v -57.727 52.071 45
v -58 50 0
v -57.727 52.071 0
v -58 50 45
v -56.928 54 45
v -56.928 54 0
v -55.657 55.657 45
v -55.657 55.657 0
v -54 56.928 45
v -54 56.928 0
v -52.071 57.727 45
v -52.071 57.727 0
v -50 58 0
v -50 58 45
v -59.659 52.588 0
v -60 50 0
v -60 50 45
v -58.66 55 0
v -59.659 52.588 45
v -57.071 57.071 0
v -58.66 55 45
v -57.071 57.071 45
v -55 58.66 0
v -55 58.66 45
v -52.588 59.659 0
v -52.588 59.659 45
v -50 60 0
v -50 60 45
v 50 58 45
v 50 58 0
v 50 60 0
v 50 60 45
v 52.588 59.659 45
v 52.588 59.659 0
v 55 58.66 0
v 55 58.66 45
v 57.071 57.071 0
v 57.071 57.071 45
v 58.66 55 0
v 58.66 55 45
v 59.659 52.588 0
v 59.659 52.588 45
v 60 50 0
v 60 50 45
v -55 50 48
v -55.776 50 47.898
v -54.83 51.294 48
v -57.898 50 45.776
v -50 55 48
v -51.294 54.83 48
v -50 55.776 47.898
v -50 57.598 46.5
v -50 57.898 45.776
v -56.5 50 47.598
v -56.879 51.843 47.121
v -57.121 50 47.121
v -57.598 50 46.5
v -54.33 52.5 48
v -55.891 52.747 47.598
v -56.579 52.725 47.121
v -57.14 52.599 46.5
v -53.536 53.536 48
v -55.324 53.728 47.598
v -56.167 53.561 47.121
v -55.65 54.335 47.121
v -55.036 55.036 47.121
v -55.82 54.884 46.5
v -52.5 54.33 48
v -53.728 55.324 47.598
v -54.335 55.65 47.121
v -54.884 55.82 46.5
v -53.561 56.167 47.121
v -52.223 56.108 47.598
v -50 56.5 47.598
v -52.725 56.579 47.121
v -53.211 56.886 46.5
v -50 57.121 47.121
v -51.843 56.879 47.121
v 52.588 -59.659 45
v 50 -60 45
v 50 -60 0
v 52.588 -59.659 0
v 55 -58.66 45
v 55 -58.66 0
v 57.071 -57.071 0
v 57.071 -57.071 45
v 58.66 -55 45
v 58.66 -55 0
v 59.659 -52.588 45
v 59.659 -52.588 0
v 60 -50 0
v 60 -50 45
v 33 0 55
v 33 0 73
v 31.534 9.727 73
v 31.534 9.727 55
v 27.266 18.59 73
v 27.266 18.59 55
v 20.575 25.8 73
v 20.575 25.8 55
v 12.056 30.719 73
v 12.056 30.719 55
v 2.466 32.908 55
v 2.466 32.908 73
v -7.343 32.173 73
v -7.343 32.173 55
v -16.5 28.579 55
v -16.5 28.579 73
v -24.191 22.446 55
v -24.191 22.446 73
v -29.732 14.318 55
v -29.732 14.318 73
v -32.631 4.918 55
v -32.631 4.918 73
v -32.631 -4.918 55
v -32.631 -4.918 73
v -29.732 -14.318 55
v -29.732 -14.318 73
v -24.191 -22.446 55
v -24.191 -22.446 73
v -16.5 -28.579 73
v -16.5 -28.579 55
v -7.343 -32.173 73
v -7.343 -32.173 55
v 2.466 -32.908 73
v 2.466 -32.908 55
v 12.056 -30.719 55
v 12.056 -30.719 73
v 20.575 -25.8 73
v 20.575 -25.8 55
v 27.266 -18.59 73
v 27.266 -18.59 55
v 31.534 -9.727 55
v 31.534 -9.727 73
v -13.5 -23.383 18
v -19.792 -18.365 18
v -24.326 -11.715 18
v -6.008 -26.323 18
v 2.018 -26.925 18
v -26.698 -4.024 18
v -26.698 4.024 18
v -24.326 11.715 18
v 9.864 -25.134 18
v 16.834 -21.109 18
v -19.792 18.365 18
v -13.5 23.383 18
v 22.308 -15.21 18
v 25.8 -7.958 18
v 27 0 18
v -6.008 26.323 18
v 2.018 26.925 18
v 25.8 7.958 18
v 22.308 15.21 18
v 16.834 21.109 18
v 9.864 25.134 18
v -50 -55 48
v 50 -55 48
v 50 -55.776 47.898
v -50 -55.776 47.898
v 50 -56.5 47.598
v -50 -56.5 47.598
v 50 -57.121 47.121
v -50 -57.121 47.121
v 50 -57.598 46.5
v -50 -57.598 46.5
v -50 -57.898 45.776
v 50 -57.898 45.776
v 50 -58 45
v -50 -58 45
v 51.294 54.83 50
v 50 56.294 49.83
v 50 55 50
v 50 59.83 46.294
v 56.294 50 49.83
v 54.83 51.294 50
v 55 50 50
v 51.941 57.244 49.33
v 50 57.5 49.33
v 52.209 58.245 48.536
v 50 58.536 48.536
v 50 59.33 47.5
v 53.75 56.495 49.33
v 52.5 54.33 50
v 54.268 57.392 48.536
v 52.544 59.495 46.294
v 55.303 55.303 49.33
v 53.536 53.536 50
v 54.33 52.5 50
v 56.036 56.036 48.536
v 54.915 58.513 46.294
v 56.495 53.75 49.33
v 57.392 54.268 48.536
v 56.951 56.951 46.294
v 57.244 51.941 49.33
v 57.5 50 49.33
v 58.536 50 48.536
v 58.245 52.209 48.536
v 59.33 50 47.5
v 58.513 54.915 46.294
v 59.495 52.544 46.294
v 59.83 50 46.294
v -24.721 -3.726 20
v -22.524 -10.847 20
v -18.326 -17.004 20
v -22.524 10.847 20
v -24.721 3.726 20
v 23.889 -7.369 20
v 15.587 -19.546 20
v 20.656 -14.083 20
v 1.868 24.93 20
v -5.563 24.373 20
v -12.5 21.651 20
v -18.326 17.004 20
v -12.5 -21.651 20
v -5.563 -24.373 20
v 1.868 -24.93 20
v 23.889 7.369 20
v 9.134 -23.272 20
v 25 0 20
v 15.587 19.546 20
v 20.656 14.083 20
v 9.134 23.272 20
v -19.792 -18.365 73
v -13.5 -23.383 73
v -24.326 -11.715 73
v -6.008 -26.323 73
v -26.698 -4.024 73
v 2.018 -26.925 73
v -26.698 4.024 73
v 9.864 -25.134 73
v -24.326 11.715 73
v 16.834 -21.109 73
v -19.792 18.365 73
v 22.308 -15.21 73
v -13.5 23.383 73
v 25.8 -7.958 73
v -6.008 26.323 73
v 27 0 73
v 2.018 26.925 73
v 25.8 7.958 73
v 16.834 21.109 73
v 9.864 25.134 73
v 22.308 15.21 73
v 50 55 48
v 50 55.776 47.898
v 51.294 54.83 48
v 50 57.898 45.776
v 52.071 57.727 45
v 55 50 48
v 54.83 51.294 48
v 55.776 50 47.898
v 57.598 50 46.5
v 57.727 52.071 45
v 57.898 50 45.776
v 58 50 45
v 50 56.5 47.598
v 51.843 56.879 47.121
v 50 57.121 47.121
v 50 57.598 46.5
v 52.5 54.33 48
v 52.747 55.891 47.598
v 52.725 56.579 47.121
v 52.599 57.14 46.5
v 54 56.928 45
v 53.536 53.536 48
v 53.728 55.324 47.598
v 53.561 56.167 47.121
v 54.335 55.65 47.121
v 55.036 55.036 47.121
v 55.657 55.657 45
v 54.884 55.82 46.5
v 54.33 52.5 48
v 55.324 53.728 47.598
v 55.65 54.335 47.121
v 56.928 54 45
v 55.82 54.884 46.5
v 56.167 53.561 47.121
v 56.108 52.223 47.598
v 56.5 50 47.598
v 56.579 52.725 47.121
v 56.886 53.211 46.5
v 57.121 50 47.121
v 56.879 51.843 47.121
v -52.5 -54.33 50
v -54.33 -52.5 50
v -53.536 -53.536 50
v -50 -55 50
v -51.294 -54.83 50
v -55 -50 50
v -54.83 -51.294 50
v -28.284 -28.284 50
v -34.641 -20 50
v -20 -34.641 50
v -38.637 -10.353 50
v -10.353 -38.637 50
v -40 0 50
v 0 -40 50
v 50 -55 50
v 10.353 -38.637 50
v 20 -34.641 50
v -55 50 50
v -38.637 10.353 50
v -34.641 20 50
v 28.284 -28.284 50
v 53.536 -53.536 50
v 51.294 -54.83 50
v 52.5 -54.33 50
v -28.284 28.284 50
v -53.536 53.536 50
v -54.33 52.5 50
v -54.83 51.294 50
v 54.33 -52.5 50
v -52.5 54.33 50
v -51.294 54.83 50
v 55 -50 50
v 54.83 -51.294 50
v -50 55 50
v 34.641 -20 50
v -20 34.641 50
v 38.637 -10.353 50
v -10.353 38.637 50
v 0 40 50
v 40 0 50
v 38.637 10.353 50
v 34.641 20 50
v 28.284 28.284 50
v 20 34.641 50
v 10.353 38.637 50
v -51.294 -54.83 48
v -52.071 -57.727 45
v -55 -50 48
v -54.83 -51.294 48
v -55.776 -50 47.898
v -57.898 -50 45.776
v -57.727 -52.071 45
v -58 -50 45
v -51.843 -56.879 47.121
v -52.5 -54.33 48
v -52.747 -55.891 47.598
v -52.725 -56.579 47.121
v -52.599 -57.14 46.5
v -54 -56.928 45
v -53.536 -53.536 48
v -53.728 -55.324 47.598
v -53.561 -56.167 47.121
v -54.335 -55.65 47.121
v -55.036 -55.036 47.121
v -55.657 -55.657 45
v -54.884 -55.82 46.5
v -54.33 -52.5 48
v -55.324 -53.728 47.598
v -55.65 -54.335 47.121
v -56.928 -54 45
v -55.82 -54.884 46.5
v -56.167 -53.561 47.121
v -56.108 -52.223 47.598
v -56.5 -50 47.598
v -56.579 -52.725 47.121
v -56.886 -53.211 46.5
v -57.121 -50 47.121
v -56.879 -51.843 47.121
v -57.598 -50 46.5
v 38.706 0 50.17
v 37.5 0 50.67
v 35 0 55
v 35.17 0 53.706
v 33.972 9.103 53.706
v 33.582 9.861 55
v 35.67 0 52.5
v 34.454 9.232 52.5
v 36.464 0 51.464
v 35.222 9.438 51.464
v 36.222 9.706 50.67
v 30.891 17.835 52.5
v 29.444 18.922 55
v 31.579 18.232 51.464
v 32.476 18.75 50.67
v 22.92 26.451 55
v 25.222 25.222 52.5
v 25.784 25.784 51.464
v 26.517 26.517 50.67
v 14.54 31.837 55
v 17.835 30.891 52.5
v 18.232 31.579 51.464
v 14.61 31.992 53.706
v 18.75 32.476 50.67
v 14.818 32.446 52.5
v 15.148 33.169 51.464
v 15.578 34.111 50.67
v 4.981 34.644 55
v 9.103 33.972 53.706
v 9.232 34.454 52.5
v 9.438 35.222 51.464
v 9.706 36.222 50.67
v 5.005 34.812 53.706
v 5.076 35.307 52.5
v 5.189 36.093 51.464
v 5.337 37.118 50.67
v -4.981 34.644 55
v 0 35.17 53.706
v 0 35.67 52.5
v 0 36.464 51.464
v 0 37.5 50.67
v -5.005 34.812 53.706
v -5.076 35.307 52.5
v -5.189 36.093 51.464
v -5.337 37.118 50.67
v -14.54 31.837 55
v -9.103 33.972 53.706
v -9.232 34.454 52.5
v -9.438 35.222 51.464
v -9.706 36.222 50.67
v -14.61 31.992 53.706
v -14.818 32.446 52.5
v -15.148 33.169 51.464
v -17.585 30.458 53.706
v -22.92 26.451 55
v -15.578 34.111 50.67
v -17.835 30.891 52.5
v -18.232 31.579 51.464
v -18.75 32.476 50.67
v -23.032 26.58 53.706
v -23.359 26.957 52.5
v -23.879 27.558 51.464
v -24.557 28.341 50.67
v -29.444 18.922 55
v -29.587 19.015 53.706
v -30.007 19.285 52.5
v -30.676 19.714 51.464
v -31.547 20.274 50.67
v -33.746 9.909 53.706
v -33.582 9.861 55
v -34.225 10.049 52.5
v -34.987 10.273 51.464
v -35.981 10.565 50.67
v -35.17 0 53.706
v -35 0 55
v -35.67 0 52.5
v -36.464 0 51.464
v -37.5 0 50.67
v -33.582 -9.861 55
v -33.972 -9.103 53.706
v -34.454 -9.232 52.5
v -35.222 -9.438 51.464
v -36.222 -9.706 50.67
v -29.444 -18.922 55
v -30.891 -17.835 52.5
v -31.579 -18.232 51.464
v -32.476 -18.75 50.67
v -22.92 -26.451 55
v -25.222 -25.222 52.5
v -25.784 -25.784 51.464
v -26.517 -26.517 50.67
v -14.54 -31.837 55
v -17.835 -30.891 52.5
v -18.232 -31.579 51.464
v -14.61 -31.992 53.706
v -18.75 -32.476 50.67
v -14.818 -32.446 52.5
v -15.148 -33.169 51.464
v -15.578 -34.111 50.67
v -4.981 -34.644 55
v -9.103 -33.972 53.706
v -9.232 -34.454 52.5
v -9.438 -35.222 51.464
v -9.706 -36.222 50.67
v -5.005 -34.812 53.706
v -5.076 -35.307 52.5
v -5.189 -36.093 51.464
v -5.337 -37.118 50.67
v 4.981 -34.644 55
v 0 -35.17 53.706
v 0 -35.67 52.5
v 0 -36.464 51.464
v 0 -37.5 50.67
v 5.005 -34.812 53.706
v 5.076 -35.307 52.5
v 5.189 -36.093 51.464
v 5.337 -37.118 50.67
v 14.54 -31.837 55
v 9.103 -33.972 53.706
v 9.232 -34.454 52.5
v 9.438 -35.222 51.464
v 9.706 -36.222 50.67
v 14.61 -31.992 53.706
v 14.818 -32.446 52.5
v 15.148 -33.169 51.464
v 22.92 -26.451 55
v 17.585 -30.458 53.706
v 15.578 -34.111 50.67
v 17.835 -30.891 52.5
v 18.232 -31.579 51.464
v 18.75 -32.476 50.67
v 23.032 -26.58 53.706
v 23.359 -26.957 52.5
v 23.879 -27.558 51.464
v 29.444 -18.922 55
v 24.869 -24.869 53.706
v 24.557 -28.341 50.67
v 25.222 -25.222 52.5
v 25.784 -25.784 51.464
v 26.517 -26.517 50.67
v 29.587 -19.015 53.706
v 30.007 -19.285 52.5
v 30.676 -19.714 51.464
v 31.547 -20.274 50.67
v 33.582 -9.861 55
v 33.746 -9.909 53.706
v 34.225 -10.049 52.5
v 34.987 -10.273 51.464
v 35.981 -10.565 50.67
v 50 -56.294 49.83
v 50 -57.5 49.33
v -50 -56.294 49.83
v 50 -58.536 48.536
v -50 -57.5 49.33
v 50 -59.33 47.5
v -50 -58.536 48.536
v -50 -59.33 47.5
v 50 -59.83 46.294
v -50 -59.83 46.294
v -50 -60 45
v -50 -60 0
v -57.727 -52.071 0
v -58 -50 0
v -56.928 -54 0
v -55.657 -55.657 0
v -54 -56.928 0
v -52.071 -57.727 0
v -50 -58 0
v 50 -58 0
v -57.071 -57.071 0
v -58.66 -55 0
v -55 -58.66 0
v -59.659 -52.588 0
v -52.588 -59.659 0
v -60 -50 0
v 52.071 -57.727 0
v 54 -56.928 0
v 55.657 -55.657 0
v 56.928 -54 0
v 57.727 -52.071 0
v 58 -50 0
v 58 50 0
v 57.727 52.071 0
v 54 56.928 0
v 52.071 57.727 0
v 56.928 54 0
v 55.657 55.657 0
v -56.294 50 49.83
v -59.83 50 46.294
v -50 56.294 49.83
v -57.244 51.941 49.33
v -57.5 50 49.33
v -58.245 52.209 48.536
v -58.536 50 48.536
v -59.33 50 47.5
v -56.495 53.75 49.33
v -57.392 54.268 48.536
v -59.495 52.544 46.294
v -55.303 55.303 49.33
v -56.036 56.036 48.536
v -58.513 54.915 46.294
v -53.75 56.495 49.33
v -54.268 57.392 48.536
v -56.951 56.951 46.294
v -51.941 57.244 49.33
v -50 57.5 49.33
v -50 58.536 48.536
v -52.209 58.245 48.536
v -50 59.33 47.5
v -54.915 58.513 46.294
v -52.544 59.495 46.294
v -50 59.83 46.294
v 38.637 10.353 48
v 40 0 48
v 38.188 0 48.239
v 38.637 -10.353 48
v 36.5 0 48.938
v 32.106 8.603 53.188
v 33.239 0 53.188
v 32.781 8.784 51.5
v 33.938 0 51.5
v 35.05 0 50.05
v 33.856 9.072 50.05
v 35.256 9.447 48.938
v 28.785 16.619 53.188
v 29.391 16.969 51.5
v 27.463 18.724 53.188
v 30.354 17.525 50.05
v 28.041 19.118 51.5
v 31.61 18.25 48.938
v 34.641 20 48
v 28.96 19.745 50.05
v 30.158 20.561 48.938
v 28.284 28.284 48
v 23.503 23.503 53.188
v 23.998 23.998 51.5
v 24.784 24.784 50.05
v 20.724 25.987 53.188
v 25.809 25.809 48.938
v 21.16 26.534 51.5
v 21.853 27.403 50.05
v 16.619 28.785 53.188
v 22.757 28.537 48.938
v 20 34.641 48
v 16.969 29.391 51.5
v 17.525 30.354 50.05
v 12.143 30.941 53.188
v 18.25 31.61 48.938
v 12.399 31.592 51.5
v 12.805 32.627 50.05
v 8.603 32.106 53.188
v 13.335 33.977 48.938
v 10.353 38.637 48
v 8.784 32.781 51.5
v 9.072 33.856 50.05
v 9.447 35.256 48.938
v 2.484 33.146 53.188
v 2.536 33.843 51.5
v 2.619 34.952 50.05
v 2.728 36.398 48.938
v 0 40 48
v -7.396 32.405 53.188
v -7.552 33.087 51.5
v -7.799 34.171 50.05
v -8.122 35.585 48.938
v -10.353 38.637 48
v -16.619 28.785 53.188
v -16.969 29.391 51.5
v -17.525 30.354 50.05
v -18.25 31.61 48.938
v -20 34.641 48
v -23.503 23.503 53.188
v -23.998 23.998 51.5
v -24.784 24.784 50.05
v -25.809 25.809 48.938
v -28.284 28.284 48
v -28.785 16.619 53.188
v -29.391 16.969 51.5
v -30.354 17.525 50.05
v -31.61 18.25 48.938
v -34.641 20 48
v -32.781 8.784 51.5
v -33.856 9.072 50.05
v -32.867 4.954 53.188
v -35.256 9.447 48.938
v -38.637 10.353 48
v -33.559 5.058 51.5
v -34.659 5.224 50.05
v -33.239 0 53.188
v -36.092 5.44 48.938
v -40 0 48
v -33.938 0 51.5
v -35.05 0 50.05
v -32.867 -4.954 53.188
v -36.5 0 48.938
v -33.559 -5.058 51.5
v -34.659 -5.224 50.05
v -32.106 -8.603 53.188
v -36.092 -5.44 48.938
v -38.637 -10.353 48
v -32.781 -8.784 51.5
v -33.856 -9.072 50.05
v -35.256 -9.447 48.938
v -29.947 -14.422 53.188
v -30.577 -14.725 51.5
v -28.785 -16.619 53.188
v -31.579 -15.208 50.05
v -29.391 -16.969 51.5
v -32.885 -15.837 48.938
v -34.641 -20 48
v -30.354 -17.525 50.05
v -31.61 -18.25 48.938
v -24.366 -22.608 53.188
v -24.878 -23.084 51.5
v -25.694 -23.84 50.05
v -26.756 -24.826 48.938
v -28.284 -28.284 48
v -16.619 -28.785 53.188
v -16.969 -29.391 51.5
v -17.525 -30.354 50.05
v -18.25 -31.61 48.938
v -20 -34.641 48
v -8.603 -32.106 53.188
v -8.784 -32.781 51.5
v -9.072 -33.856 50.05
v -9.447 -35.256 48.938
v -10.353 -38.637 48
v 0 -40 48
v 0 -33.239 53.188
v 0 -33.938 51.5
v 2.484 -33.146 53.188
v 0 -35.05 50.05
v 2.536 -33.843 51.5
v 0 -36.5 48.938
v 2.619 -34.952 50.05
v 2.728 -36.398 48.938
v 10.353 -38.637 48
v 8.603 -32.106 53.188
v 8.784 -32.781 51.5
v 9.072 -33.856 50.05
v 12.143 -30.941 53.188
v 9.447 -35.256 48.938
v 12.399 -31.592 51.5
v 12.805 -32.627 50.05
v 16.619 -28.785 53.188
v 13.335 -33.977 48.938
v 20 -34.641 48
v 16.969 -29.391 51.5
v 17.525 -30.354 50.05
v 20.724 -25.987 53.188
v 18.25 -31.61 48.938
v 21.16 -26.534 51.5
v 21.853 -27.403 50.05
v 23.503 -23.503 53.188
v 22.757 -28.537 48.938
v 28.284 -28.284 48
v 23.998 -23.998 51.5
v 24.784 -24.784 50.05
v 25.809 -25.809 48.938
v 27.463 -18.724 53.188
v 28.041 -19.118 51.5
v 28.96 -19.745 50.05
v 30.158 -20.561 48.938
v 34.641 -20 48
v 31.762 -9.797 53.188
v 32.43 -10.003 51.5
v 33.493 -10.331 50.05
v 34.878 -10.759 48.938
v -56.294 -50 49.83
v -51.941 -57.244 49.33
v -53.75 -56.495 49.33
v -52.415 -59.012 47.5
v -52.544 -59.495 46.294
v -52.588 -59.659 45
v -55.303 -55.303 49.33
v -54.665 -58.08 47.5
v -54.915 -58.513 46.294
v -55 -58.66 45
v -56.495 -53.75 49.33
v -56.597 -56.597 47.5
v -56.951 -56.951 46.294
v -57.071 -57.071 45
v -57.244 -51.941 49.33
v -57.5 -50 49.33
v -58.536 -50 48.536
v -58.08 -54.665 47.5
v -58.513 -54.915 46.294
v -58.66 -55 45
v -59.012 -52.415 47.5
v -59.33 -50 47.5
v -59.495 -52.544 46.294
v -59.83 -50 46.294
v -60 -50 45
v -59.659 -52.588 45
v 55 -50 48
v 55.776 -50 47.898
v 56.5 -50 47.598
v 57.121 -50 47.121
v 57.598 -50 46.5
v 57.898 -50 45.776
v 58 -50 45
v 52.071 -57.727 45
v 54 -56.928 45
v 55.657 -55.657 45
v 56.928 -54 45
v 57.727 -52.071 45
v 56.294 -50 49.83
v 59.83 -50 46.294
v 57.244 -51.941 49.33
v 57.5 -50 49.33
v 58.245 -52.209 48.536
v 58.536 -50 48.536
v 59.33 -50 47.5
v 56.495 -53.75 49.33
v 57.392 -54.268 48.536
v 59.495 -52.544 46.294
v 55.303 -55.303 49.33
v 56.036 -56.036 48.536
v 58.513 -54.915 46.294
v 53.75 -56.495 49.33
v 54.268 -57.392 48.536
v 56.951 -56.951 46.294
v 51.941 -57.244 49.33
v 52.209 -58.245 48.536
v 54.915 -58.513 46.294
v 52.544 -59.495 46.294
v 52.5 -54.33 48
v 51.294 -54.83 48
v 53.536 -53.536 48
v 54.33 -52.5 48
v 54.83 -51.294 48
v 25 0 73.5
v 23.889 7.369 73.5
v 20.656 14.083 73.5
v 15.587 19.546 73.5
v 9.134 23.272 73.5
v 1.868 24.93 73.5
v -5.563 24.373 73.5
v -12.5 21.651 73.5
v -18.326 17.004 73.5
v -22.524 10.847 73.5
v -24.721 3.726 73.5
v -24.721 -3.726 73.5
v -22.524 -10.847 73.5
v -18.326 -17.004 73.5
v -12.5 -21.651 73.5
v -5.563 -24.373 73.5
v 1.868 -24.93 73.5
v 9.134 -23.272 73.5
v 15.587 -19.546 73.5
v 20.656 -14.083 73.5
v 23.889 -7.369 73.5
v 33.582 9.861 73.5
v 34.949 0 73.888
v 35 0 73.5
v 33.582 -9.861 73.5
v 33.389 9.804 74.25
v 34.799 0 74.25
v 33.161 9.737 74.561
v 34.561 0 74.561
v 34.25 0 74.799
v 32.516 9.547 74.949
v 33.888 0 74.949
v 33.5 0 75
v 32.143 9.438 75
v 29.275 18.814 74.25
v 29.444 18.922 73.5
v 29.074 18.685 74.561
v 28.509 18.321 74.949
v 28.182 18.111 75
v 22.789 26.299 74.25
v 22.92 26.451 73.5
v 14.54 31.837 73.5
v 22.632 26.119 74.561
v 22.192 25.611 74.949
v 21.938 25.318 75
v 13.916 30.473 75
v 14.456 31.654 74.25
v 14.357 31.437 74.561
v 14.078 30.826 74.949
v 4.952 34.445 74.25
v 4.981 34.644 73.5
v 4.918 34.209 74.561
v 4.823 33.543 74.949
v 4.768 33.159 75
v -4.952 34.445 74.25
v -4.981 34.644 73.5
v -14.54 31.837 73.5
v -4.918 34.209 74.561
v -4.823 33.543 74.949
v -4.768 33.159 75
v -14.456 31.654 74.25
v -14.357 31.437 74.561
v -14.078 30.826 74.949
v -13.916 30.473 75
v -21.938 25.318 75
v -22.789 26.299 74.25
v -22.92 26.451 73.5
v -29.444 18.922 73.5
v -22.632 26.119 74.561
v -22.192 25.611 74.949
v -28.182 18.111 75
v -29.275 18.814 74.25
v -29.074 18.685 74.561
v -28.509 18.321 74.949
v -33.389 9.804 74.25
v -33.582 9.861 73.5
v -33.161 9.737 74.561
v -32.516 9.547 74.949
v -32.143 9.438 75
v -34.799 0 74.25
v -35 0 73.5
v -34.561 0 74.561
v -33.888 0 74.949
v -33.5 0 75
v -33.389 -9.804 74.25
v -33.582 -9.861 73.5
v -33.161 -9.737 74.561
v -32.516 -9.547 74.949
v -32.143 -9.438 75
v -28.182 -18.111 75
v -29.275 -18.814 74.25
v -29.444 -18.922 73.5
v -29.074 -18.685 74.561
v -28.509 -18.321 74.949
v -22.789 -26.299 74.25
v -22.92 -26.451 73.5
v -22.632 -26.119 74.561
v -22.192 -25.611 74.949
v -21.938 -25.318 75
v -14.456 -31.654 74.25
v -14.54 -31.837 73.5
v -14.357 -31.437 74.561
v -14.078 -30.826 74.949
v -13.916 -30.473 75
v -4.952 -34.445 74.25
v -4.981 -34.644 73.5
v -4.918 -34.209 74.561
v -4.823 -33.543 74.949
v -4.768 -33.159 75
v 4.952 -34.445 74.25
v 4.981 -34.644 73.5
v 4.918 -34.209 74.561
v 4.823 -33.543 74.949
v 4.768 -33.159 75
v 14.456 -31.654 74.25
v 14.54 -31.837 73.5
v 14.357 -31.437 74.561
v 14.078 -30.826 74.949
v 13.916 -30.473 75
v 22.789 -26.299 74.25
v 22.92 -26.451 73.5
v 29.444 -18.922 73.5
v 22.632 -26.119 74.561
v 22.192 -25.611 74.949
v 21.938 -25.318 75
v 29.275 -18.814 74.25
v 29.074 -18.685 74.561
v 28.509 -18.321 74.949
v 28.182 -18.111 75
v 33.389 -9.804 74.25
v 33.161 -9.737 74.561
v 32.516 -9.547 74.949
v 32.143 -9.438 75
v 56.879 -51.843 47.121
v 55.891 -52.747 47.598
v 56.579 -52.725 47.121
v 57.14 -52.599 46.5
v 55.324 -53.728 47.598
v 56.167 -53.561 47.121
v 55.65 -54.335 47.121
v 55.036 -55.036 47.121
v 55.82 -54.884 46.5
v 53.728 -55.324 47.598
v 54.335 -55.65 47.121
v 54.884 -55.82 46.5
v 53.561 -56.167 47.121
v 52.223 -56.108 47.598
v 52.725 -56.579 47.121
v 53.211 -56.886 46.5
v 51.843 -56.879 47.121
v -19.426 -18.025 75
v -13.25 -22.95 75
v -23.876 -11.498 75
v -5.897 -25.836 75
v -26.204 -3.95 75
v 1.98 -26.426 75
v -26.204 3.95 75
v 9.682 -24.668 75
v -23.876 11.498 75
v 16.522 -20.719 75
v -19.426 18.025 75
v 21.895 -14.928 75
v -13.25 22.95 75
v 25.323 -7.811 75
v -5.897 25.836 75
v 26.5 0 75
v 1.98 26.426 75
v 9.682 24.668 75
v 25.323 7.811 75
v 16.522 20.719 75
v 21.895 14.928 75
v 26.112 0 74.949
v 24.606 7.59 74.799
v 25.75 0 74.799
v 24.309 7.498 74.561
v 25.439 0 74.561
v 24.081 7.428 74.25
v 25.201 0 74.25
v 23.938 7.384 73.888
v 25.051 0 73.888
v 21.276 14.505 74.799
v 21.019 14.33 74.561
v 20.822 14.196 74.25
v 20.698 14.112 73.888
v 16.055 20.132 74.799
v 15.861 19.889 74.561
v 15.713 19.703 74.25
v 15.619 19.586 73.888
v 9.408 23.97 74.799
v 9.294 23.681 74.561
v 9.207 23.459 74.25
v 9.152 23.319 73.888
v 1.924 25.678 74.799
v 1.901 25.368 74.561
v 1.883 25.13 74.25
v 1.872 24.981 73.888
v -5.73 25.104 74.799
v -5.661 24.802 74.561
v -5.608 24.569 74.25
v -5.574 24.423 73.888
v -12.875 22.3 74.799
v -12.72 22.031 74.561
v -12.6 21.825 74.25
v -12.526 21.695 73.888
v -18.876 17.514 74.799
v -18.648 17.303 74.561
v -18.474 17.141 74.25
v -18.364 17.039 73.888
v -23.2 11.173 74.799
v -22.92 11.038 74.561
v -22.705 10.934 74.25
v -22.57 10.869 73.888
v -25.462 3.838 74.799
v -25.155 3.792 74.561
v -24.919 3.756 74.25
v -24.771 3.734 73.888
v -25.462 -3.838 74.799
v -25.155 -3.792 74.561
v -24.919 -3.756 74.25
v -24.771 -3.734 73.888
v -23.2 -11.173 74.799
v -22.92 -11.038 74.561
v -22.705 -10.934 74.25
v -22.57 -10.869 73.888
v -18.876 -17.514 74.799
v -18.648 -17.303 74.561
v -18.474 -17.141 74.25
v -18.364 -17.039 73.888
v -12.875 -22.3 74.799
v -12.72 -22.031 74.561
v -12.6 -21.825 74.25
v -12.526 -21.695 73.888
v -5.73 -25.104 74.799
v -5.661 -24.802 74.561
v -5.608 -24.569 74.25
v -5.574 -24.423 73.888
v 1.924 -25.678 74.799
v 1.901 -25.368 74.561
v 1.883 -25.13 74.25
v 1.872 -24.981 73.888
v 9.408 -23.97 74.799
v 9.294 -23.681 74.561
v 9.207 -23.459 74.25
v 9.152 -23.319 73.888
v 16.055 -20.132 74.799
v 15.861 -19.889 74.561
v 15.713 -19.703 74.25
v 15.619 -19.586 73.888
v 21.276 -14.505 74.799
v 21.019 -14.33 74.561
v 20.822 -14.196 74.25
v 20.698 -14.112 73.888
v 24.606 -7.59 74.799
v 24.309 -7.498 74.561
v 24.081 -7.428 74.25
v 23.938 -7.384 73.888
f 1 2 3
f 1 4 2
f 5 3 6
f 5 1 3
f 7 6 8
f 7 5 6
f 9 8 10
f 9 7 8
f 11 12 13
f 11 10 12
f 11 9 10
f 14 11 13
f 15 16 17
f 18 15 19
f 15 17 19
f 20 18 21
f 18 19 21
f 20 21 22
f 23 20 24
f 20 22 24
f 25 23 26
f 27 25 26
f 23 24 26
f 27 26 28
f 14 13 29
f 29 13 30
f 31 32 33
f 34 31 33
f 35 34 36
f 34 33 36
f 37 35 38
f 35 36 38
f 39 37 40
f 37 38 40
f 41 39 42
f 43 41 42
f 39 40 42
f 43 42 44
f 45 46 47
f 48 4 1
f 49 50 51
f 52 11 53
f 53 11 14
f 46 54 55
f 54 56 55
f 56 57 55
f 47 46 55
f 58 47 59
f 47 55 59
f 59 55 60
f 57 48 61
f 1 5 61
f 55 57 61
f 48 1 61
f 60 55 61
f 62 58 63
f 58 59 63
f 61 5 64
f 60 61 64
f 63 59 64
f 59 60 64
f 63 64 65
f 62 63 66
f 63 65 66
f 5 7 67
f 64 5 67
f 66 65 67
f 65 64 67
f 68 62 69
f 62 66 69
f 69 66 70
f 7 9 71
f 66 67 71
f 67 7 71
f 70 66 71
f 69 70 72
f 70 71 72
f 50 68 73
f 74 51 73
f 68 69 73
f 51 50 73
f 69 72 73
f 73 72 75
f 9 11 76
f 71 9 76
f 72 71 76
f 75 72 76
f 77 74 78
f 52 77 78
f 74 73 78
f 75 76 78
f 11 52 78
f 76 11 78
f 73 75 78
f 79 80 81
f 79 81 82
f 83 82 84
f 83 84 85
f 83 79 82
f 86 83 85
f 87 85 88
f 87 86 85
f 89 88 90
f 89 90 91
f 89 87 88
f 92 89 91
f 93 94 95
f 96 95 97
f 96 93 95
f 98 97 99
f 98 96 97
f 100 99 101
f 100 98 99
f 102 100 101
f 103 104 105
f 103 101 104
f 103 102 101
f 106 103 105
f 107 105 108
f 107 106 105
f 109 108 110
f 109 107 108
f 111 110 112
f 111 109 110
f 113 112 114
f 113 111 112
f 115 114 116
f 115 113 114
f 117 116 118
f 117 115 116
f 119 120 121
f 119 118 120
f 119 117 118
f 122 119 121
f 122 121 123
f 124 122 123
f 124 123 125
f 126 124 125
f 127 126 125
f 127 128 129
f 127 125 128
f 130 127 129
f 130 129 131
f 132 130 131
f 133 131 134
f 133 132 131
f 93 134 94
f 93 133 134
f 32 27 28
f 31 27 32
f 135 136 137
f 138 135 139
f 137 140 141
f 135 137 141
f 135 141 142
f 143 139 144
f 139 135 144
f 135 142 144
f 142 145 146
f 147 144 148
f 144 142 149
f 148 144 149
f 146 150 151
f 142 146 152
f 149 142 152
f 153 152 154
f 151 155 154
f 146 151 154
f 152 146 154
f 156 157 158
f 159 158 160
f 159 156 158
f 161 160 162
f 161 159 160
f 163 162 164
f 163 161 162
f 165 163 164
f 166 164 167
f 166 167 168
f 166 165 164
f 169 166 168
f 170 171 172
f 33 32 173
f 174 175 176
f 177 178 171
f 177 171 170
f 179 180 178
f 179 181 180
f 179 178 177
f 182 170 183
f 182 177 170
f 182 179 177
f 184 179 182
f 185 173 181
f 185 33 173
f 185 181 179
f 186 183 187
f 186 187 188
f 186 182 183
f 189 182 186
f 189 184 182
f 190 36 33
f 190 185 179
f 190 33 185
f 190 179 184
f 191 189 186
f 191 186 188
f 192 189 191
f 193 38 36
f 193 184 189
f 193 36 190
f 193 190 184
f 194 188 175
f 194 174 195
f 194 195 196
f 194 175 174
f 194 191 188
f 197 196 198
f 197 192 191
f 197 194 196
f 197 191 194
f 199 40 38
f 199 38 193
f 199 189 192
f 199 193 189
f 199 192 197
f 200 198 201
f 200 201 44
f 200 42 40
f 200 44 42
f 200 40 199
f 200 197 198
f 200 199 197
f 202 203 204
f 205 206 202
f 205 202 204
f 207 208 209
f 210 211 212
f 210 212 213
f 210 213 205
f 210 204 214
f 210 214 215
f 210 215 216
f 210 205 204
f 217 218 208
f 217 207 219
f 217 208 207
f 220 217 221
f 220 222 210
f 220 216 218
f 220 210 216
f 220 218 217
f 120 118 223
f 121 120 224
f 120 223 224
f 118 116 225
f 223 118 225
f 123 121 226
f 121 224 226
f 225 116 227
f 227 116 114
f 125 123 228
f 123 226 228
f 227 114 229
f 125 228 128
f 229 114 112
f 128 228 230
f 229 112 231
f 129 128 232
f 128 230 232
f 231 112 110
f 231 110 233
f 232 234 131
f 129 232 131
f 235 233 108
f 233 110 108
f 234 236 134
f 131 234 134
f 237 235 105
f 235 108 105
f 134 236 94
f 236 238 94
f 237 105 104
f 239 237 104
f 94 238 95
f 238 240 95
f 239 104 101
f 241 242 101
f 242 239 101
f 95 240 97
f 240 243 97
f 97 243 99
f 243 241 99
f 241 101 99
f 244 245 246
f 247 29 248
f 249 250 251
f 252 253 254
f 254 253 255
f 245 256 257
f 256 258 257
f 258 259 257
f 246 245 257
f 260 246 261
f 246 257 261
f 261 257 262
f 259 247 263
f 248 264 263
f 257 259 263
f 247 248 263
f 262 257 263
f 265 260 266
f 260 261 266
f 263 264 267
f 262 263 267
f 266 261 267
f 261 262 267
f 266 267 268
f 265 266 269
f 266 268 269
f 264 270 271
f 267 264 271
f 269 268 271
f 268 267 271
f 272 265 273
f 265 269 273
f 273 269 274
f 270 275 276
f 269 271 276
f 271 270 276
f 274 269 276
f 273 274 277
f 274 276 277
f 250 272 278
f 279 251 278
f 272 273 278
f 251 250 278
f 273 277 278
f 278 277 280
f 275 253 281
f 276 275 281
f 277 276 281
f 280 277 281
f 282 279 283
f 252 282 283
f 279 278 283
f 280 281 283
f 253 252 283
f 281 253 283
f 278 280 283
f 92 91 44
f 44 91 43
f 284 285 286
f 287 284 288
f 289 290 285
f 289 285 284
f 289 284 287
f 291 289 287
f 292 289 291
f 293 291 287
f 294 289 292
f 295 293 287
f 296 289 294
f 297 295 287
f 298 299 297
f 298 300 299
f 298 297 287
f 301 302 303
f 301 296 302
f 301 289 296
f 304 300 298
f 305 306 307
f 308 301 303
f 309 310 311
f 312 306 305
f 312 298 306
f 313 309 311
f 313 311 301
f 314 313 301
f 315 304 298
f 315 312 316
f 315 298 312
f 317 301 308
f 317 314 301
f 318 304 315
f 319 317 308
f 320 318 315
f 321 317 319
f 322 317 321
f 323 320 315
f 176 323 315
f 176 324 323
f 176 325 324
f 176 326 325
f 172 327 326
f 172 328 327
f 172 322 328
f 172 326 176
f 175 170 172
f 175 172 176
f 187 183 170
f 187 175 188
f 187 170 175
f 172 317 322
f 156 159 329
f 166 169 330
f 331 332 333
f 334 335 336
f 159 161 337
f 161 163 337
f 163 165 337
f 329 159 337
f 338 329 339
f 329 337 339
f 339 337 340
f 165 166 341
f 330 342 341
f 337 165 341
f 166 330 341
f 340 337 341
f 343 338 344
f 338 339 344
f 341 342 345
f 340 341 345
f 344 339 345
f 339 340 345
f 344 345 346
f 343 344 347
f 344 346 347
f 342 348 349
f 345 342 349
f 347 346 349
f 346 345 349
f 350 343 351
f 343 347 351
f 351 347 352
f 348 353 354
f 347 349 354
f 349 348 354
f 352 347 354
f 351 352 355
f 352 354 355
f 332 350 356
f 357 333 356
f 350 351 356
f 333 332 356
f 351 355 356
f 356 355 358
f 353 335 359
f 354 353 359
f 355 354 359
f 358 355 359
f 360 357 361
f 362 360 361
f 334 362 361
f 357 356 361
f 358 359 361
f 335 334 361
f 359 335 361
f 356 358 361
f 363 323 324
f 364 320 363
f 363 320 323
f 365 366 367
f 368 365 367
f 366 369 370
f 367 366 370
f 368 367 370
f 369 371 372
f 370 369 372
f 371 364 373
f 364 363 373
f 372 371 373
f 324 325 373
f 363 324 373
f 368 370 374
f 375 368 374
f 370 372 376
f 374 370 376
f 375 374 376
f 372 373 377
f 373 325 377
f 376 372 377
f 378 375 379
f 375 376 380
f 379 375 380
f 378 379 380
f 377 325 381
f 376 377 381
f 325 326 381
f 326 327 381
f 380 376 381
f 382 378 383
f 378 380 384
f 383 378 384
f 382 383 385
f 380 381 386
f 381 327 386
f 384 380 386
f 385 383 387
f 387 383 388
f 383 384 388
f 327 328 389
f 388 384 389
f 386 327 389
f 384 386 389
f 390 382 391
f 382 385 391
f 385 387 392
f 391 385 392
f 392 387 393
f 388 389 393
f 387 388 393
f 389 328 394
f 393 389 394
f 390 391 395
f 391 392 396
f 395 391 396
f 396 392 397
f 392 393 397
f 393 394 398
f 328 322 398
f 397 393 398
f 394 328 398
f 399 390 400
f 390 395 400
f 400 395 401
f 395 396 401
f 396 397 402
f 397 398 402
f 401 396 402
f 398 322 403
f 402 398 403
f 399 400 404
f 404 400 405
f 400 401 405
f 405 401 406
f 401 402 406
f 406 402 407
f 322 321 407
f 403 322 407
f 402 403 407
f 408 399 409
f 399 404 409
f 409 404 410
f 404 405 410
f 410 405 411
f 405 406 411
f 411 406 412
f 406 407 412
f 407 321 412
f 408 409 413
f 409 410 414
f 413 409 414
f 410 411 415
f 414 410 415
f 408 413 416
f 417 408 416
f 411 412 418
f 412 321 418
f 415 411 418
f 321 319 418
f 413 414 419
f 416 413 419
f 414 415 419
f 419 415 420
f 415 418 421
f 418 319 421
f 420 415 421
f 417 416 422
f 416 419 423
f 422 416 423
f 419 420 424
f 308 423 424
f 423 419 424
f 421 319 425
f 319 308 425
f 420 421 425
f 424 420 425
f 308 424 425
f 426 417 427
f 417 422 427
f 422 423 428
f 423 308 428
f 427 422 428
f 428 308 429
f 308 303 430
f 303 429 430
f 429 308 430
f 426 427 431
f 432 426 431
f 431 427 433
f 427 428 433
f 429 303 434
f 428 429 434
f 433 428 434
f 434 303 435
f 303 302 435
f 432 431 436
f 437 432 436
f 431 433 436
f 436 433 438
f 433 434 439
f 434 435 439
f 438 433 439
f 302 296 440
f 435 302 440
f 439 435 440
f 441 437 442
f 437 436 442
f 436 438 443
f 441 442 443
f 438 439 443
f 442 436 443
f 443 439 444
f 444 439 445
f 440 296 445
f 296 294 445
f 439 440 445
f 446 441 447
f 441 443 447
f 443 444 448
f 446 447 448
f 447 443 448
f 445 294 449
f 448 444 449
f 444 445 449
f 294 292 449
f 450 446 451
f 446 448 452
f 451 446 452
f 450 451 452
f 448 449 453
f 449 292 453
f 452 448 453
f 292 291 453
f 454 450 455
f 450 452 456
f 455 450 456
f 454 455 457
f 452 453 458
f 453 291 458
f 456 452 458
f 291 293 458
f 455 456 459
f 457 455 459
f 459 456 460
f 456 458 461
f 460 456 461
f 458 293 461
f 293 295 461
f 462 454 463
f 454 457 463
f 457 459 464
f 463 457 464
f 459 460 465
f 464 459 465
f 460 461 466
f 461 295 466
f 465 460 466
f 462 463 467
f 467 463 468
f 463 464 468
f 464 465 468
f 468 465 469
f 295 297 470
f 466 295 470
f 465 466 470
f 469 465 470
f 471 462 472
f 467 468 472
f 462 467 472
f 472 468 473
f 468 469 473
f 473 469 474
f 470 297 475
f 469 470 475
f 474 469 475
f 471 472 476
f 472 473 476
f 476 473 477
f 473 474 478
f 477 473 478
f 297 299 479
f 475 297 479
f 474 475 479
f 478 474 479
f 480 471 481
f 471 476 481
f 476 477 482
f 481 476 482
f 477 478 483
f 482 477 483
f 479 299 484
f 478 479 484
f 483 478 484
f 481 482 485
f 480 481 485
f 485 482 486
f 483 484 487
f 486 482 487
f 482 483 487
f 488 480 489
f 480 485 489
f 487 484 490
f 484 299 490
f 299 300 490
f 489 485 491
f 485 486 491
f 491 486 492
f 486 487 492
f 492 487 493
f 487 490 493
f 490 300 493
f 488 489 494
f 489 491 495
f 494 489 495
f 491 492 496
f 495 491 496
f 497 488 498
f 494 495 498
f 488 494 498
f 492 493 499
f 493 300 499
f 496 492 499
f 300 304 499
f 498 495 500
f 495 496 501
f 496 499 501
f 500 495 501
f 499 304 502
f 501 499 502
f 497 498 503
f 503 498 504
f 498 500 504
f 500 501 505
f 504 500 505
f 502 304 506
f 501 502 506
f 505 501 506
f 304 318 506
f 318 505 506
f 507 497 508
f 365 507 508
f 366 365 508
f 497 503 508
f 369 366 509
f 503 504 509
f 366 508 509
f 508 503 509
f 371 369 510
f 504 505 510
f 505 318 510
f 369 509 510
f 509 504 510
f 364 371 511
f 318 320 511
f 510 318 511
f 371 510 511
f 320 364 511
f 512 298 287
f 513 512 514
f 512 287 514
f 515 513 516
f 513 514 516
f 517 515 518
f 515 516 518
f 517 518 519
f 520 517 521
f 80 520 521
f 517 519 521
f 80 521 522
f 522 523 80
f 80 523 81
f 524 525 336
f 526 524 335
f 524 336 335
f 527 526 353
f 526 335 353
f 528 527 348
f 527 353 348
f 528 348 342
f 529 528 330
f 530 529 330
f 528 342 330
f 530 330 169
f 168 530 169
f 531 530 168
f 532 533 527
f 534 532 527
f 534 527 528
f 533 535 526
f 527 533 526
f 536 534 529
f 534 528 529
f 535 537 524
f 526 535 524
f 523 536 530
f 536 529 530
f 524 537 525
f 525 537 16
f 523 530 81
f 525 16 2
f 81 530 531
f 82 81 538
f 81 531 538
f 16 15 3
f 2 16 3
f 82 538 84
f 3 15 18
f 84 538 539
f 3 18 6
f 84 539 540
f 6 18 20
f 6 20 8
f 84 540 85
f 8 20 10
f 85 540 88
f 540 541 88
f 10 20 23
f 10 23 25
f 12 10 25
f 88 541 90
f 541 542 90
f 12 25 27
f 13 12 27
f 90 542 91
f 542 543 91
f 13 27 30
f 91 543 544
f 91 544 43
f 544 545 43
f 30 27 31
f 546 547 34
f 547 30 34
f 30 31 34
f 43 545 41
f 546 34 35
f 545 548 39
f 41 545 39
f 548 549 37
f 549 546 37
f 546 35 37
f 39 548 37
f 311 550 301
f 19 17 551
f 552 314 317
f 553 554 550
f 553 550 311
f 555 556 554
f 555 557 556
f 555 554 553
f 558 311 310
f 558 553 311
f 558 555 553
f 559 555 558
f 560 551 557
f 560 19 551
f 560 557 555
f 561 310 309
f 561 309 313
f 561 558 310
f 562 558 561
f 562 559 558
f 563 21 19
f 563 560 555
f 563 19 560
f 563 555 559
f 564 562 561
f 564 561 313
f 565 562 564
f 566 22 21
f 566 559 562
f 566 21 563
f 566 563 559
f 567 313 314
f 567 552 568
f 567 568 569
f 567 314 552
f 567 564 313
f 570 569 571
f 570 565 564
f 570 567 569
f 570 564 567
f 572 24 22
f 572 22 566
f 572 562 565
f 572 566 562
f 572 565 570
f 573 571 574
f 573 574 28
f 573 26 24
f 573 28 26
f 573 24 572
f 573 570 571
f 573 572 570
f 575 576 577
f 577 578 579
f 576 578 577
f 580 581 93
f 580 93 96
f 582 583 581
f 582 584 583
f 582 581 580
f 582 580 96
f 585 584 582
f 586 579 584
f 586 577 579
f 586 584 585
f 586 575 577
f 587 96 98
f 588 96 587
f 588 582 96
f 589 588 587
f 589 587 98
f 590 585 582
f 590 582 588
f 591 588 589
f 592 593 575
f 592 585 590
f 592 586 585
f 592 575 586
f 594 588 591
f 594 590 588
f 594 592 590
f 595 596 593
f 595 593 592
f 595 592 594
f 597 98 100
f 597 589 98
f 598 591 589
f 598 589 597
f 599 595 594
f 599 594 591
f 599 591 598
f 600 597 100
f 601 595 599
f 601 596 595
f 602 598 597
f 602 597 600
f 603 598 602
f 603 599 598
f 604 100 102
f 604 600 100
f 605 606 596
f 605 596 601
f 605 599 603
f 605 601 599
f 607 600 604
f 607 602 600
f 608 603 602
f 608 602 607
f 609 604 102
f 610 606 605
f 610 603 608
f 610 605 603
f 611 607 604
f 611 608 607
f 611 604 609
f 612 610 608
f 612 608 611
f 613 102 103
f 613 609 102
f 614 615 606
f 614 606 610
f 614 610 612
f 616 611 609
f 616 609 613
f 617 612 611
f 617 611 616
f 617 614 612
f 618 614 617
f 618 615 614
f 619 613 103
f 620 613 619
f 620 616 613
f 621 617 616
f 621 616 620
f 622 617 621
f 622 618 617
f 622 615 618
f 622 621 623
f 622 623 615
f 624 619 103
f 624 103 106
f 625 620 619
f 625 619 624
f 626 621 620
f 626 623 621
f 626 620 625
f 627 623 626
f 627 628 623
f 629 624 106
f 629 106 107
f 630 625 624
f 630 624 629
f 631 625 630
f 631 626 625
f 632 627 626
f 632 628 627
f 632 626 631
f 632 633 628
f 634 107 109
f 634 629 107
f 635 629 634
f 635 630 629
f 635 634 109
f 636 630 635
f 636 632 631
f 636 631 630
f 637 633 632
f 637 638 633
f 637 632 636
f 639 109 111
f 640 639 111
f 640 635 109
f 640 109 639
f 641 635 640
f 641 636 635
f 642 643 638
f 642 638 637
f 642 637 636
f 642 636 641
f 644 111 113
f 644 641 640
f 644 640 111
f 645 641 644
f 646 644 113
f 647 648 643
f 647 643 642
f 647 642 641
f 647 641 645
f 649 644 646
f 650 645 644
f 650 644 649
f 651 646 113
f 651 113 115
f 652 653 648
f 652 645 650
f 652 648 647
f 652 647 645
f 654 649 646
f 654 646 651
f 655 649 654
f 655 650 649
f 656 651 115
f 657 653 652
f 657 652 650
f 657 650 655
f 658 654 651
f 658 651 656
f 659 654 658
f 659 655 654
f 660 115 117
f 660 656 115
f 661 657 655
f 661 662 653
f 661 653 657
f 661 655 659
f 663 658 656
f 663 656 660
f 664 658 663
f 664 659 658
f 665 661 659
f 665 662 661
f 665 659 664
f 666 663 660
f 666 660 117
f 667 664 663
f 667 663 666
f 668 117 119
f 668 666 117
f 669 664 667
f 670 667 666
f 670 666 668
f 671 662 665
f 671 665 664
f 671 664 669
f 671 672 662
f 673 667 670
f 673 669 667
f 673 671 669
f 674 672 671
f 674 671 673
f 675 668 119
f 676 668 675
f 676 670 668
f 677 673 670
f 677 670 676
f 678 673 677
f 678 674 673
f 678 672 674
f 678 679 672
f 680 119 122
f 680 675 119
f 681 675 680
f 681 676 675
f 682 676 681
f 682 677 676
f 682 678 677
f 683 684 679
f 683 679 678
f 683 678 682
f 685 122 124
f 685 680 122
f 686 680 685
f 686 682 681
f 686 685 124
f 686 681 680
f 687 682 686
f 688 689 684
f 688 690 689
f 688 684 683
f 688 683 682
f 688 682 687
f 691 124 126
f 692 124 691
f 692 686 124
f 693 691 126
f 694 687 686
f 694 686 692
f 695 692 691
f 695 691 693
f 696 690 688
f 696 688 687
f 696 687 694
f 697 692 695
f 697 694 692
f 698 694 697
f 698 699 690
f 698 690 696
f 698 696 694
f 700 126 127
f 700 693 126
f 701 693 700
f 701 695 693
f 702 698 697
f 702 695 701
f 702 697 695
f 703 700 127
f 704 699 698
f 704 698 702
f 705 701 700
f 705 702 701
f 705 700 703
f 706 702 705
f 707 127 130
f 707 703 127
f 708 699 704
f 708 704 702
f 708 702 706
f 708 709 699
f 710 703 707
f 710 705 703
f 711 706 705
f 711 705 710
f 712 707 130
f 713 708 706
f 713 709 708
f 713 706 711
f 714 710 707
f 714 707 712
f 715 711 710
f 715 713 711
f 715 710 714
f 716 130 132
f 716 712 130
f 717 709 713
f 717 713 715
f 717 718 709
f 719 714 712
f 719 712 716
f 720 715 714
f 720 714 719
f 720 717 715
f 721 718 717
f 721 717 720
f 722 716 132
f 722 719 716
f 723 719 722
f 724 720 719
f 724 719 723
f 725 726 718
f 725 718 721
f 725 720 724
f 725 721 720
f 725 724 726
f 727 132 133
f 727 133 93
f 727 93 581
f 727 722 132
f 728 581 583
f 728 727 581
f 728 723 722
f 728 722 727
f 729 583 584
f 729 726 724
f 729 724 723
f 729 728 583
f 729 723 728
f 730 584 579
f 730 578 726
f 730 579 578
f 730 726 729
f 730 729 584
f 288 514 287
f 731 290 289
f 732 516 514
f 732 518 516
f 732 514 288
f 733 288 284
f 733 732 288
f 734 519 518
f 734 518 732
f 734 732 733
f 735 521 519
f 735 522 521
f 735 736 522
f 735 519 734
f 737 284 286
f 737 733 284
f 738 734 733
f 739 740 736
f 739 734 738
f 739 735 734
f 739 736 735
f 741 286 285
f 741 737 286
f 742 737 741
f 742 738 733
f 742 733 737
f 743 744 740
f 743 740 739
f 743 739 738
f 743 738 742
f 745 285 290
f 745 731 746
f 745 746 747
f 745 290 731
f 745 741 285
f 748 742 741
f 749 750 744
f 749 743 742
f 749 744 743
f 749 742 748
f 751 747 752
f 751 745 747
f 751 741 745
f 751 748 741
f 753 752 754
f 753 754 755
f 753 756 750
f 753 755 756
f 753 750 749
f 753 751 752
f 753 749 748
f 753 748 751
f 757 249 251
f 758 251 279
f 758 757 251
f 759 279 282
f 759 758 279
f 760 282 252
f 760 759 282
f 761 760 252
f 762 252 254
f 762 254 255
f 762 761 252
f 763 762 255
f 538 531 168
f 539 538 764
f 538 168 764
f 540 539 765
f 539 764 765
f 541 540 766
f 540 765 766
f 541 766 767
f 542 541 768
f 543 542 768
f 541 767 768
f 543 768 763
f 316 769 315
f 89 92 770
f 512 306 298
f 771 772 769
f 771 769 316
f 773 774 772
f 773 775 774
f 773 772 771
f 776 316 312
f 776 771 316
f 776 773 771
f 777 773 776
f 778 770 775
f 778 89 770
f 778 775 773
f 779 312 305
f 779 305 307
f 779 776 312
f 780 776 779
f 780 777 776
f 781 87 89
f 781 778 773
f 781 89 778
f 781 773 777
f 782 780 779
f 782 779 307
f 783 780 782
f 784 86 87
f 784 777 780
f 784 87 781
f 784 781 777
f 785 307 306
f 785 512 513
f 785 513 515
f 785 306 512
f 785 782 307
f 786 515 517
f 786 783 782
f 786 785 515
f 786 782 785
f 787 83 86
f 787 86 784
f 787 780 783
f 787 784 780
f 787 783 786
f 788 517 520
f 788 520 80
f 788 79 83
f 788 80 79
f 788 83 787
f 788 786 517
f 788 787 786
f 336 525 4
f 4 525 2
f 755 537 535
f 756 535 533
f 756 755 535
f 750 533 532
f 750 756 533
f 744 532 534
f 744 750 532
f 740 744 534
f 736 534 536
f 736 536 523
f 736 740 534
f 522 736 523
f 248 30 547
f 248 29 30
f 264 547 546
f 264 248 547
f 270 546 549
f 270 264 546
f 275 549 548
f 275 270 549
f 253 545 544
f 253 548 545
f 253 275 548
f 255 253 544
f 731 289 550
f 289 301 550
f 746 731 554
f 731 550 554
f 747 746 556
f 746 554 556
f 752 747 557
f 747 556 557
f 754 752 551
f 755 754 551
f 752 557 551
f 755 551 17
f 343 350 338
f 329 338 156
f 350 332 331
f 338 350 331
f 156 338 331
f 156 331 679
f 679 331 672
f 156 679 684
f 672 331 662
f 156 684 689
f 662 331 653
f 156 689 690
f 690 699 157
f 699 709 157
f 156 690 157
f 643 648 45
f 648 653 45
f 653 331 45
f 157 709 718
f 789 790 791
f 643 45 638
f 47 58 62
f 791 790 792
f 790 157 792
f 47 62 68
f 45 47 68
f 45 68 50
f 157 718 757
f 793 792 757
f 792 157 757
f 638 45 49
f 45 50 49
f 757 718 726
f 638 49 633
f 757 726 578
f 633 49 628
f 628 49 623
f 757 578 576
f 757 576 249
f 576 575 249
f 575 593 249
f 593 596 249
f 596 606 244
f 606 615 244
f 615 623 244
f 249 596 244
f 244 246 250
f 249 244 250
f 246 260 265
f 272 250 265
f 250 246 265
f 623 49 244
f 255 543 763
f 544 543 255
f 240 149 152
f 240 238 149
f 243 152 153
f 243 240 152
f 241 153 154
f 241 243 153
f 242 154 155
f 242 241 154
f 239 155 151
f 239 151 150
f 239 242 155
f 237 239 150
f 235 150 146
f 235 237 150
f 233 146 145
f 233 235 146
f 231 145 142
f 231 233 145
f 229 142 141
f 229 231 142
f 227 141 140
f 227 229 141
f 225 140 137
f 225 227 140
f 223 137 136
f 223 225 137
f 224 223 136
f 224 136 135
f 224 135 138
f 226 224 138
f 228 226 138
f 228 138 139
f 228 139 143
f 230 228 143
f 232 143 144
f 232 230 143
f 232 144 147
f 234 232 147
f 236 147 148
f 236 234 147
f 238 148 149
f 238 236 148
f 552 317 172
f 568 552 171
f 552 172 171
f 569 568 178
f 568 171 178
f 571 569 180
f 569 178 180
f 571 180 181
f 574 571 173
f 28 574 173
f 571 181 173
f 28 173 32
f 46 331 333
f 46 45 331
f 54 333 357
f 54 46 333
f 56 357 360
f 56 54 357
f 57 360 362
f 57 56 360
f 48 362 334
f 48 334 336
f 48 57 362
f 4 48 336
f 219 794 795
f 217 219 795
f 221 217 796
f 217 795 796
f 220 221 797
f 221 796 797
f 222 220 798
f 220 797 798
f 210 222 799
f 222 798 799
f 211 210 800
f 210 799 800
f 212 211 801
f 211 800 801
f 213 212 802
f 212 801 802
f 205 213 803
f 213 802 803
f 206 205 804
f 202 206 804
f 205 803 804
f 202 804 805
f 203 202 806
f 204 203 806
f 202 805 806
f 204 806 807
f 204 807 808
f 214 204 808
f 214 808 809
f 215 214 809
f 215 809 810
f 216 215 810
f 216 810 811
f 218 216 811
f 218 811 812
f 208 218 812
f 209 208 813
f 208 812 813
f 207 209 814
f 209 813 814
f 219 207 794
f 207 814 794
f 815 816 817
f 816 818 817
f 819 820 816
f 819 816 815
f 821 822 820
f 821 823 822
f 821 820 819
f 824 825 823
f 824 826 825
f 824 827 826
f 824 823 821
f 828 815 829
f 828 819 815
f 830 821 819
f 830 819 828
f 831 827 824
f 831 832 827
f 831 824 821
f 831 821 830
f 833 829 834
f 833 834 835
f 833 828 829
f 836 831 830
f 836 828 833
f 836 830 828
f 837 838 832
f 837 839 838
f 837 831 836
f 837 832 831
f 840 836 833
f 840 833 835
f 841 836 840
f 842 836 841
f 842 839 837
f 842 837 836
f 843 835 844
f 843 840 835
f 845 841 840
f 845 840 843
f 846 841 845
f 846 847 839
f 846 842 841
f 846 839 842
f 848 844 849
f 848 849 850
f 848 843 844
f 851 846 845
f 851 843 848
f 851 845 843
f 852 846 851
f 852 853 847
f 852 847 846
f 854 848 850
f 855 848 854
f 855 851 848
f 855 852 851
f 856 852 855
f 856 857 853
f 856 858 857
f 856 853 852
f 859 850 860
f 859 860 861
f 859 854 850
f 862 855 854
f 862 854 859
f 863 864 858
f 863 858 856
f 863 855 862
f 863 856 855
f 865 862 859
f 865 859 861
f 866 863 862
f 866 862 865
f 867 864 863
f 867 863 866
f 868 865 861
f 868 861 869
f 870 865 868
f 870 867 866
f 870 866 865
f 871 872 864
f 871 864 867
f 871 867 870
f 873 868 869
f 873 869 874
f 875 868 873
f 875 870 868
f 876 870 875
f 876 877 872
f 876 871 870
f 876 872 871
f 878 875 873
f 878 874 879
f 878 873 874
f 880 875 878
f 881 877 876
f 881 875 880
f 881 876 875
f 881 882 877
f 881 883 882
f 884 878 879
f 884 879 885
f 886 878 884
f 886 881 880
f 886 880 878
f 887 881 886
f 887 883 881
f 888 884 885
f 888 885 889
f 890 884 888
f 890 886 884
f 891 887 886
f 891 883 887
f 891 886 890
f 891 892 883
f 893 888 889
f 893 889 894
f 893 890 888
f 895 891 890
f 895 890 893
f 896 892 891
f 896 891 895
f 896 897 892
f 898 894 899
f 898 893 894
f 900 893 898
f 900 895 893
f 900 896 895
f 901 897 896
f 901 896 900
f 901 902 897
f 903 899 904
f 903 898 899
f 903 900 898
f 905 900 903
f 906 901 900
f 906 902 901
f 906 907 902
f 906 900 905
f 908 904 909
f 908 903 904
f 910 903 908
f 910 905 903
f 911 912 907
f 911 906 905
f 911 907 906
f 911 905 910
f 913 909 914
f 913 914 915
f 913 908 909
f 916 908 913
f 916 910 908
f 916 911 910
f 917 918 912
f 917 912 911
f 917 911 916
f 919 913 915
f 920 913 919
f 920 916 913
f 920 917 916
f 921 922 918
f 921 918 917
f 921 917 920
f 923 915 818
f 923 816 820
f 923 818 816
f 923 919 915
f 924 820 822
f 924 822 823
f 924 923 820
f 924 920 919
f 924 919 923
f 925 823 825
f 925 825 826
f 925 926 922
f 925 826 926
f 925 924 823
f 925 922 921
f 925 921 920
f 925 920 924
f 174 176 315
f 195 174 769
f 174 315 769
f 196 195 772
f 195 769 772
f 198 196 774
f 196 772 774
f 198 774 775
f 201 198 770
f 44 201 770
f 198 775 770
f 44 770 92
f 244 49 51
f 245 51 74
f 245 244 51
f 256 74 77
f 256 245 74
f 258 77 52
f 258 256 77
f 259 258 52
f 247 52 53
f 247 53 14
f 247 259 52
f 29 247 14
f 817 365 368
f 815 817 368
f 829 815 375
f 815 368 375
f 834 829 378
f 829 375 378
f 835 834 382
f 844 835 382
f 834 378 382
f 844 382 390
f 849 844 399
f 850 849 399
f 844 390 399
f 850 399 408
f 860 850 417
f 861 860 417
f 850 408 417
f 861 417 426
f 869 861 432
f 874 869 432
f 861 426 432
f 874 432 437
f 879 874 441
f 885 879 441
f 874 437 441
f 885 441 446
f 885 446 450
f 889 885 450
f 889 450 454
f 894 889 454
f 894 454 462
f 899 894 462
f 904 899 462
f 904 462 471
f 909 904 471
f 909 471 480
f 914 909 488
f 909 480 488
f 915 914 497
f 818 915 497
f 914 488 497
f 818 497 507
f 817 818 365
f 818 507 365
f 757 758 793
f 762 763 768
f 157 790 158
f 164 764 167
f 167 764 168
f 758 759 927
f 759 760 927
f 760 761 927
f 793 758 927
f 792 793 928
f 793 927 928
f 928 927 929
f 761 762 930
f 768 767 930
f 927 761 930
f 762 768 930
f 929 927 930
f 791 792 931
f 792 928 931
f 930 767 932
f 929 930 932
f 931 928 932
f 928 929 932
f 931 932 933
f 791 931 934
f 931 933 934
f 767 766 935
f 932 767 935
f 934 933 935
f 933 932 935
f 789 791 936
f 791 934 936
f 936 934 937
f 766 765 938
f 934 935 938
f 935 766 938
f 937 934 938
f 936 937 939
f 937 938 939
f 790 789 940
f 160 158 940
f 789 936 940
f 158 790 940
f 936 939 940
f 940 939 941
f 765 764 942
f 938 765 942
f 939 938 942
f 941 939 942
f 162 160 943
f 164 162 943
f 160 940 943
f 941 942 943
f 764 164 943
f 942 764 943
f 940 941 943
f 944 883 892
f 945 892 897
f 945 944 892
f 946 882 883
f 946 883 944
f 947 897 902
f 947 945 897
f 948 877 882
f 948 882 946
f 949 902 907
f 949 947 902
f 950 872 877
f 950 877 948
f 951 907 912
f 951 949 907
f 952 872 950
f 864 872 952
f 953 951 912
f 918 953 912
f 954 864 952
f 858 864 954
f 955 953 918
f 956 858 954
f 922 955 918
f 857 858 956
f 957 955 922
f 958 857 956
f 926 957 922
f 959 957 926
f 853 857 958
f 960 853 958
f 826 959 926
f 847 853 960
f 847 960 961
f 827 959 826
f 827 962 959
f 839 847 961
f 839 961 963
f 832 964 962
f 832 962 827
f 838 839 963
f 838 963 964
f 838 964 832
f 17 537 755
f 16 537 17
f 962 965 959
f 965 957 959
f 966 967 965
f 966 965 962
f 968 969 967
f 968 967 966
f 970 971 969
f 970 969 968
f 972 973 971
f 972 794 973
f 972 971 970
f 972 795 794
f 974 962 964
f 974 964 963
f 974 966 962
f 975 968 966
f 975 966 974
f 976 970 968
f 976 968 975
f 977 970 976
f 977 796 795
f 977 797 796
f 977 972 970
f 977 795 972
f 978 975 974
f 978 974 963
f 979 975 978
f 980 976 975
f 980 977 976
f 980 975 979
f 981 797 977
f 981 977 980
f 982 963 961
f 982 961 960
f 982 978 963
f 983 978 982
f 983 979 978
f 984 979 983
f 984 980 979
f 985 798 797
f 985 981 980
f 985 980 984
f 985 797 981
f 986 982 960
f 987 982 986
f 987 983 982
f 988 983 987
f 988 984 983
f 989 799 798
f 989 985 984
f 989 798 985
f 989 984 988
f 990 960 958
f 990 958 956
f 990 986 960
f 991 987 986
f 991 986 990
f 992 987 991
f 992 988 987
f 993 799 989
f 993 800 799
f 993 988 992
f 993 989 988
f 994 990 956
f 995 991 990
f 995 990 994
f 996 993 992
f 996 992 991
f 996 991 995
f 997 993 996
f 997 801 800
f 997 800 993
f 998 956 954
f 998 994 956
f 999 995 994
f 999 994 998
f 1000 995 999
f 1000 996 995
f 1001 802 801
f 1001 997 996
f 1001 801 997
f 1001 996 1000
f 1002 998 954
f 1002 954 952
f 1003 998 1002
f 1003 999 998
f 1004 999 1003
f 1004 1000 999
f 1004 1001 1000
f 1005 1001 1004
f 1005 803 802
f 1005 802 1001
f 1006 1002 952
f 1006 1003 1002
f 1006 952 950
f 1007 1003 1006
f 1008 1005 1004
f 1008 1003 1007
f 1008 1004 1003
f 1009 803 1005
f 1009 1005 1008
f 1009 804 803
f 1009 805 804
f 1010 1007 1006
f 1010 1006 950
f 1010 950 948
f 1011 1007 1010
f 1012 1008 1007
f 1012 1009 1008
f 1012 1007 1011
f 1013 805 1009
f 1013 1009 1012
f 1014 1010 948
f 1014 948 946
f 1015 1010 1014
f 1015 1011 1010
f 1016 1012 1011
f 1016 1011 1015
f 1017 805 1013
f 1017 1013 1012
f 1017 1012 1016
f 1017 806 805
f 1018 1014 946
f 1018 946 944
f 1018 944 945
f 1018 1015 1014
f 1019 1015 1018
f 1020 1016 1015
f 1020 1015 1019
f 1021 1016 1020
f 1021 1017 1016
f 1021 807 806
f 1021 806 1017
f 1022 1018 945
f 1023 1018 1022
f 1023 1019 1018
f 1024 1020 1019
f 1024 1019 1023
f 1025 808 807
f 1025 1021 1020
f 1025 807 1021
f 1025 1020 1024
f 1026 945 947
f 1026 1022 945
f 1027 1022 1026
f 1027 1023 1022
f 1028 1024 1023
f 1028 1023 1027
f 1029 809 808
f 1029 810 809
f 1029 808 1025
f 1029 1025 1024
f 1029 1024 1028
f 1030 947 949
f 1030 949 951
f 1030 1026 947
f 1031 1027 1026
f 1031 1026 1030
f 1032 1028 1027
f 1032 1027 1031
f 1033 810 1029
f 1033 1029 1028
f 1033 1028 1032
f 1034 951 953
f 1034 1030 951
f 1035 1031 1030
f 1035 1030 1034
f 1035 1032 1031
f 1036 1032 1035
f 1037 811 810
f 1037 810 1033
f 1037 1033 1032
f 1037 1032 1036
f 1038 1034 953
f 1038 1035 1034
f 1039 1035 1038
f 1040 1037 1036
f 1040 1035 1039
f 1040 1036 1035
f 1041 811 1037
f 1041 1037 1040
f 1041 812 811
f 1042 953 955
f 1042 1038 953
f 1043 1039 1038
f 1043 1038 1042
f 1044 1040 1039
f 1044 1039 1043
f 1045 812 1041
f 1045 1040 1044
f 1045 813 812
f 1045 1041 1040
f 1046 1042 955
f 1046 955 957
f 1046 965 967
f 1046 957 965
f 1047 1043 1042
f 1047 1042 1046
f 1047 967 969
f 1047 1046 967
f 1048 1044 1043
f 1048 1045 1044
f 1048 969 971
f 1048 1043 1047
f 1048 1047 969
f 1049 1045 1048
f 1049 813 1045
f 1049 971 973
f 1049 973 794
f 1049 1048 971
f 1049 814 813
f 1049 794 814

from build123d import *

# Parameters (mm, degrees)
SKETCH1_W           = 120
SKETCH1_H           = 120
BOSS_EXTRUDE2_DEPTH = 50
SKETCH2_R           = 35
BOSS_EXTRUDE3_DEPTH = 25
SKETCH3_R           = 25
CUT_EXTRUDE1_DEPTH  = 55
FILLET1_R           = 10
FILLET2_R           = 1.5
FILLET3_R           = 5
SHELL1_T            = -2


with BuildPart() as part:
    # Sketch1 → Boss-Extrude2 (new body)
    with BuildSketch(Plane.XY):
        Rectangle(SKETCH1_W, SKETCH1_H)
    extrude(amount=BOSS_EXTRUDE2_DEPTH)

    # Sketch2 → Boss-Extrude3 (add)
    with BuildSketch(Plane.XY.offset(50)):
        Circle(SKETCH2_R)
    extrude(amount=BOSS_EXTRUDE3_DEPTH)

    # Sketch3 → Cut-Extrude1 (cut)
    with BuildSketch(Plane.XY.offset(75)):
        Circle(SKETCH3_R)
    extrude(amount=-CUT_EXTRUDE1_DEPTH, mode=Mode.SUBTRACT)

    # Fillet1
    fillet1_edges = [part.edges().sort_by_distance(p)[0] for p in [
        (-60, 60, 25),
        (-60, -60, 25),
        (60, -60, 25),
        (60, 60, 25),
    ]]
    fillet(fillet1_edges, radius=FILLET1_R)

    # Fillet2
    fillet2_edges = [part.edges().sort_by_distance(p)[0] for p in [
        (-35, 0, 75),
        (-25, 0, 75),
    ]]
    fillet(fillet2_edges, radius=FILLET2_R)

    # Fillet3
    fillet3_edges = [part.edges().sort_by_distance(p)[0] for p in [
        (-35, 0, 50),
        (-60, 0, 50),
        (0, 60, 50),
        (0, -60, 50),
        (60, 0, 50),
        (-57.071067812, -57.071067812, 50),
        (57.071067812, -57.071067812, 50),
        (57.071067812, 57.071067812, 50),
        (-57.071067812, 57.071067812, 50),
    ]]
    fillet(fillet3_edges, radius=FILLET3_R)

    # Shell1
    shell1_openings = [part.faces().sort_by_distance(p)[0] for p in [
        (0, 0, 0),
    ]]
    offset(amount=SHELL1_T, openings=shell1_openings, kind=Kind.INTERSECTION)


solid = part.part
